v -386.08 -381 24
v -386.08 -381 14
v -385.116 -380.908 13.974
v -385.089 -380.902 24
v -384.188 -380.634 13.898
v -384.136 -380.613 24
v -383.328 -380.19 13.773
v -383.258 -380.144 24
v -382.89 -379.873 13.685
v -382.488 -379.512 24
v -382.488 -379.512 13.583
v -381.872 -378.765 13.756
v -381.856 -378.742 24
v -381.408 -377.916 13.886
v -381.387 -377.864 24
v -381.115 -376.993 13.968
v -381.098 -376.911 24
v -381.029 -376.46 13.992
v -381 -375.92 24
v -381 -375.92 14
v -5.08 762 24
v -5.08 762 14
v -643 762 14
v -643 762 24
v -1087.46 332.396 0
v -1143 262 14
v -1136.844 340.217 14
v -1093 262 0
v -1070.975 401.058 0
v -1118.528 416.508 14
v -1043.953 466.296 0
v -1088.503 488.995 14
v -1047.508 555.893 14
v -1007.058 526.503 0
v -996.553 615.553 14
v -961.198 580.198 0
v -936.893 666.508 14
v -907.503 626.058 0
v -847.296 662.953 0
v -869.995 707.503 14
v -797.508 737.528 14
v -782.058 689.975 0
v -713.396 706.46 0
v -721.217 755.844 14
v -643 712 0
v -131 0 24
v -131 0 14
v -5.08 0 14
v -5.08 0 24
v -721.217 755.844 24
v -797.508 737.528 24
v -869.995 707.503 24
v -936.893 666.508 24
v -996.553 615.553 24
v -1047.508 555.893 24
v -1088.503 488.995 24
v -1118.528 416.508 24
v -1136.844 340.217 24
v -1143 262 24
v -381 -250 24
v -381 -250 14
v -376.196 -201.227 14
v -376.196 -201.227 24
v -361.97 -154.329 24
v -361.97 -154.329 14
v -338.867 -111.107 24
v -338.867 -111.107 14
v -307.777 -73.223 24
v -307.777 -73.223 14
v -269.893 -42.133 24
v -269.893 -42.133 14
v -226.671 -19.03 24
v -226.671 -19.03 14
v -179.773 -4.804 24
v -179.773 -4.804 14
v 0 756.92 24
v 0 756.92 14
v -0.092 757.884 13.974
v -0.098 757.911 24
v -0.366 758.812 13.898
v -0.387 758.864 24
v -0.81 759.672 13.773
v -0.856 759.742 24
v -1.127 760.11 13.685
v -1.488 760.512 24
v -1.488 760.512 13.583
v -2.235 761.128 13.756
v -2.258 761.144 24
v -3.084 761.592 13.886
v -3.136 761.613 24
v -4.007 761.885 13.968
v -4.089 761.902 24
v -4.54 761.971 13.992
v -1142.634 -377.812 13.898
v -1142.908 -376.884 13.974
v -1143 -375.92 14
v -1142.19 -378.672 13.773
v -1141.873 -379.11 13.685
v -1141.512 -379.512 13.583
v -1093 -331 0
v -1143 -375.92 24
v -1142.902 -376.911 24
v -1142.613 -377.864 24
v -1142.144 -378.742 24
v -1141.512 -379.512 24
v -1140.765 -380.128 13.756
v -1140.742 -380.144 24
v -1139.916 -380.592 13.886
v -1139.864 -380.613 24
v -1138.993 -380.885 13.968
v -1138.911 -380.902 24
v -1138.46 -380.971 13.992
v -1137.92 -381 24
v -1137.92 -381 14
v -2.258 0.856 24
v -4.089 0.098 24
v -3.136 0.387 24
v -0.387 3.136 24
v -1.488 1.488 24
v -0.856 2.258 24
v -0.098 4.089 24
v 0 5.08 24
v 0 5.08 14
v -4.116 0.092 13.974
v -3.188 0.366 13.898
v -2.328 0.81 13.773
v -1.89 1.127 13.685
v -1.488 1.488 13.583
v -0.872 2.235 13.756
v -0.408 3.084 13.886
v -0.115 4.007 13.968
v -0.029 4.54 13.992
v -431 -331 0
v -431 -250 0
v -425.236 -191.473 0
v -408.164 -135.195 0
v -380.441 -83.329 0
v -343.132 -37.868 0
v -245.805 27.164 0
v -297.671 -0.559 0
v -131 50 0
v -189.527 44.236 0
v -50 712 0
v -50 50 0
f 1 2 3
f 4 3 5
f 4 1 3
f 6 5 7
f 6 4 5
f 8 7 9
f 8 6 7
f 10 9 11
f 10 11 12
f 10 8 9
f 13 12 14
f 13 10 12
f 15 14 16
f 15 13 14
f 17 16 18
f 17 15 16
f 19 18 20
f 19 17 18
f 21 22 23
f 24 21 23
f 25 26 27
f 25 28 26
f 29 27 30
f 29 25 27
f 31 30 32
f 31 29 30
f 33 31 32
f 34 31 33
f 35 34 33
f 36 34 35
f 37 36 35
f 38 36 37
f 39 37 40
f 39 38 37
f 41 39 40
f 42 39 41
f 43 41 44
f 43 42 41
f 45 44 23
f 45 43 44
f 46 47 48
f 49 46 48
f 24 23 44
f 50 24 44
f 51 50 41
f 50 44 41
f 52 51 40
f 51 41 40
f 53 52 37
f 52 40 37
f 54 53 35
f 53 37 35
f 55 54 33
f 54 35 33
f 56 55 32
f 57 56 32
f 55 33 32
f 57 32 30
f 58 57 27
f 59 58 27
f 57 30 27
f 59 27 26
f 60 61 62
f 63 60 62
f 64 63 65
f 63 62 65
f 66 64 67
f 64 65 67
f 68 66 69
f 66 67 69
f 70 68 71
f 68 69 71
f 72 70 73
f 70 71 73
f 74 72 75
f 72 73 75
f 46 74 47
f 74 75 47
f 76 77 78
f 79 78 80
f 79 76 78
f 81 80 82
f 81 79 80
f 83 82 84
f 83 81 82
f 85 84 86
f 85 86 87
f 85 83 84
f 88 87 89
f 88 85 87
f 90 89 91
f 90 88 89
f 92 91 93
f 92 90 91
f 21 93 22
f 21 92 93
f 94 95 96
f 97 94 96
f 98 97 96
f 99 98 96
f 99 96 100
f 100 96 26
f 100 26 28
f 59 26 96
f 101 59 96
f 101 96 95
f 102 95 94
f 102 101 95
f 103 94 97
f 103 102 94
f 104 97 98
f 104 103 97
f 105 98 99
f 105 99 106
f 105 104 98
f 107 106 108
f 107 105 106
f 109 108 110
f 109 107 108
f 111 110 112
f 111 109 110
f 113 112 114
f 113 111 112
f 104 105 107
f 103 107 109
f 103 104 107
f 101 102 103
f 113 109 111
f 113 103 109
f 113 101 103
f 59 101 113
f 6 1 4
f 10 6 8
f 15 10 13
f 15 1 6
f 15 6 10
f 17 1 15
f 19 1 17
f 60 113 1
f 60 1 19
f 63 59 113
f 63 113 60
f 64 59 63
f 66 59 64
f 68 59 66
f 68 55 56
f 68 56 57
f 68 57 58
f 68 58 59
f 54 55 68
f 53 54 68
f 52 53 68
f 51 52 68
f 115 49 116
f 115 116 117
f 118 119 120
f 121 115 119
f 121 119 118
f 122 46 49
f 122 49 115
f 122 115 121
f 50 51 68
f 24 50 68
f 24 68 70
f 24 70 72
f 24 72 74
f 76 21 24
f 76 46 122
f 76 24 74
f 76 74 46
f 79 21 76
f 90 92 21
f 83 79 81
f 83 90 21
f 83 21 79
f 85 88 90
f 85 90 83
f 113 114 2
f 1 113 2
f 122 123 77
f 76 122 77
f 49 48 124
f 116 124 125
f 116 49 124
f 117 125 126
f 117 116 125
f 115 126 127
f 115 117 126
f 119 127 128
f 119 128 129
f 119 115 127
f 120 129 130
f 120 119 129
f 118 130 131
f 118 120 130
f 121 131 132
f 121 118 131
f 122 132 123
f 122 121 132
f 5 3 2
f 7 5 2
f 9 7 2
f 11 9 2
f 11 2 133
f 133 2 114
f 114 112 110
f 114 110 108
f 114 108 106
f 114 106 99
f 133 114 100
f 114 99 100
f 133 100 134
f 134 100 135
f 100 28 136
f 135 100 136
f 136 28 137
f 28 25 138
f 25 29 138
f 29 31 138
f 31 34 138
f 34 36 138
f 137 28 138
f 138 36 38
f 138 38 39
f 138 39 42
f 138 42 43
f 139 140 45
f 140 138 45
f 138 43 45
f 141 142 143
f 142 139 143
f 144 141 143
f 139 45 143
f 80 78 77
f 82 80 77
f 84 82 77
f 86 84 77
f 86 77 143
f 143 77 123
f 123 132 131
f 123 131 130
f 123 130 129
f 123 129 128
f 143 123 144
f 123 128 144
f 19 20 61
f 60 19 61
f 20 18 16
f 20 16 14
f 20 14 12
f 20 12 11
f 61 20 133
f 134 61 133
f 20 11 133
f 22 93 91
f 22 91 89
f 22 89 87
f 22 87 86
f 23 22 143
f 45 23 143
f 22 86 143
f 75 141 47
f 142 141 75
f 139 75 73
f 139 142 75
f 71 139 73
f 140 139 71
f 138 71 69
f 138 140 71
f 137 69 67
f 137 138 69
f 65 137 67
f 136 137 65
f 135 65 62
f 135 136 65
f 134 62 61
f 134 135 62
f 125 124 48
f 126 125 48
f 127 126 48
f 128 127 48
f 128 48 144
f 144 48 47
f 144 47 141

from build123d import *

# Parameters (mm, degrees)
F1_DEPTH = 24
F5_R     = 5.08


with BuildPart() as f1:
    # F0 (on Top) → F1 (new body)
    with BuildSketch(Plane.XY):
        with BuildLine():
            Line((-131, 0), (0, 0))
            Line((0, 0), (0, 762))
            Line((0, 762), (-643, 762))
            ThreePointArc((-643, 762), (-996.5533905933, 615.5533905933), (-1143, 262))
            Line((-1143, 262), (-1143, -381))
            Line((-1143, -381), (-381, -381))
            Line((-381, -381), (-381, -250))
            ThreePointArc((-381, -250), (-307.7766952966, -73.2233047034), (-131, 0))
        make_face()
    extrude(amount=F1_DEPTH)

    # F4: sweep along a path in F3
    with BuildLine(Plane(origin=(0, 0, 0), x_dir=(1, 0, 0), z_dir=(0, 0, -1))) as f4_path:
        Line((-381, 381), (-1143, 381))
        Line((-1143, 381), (-1143, -262))
        ThreePointArc((-1143, -262), (-996.5533905933, -615.5533905933), (-643, -762))
        Line((-643, -762), (0, -762))
        Line((0, -762), (0, 0))
        Line((0, 0), (-131, 0))
        ThreePointArc((-131, 0), (-307.7766952966, 73.2233047034), (-381, 250))
        Line((-381, 250), (-381, 381))
    # F2 (on face) → F4 (sweep, cut)
    with BuildSketch(Plane.YZ):
        Polygon((762, 0), (762, 14), (712, 0), align=None)
    sweep(path=f4_path.line, transition=Transition.RIGHT, mode=Mode.SUBTRACT)

    # F5
    f5_edges = [f1.edges().sort_by_distance(p)[0] for p in [
        (0, 762, 19),
        (0, 0, 19),
        (-381, -381, 19),
        (-1143, -381, 19),
    ]]
    fillet(f5_edges, radius=F5_R)


solid = f1.part
